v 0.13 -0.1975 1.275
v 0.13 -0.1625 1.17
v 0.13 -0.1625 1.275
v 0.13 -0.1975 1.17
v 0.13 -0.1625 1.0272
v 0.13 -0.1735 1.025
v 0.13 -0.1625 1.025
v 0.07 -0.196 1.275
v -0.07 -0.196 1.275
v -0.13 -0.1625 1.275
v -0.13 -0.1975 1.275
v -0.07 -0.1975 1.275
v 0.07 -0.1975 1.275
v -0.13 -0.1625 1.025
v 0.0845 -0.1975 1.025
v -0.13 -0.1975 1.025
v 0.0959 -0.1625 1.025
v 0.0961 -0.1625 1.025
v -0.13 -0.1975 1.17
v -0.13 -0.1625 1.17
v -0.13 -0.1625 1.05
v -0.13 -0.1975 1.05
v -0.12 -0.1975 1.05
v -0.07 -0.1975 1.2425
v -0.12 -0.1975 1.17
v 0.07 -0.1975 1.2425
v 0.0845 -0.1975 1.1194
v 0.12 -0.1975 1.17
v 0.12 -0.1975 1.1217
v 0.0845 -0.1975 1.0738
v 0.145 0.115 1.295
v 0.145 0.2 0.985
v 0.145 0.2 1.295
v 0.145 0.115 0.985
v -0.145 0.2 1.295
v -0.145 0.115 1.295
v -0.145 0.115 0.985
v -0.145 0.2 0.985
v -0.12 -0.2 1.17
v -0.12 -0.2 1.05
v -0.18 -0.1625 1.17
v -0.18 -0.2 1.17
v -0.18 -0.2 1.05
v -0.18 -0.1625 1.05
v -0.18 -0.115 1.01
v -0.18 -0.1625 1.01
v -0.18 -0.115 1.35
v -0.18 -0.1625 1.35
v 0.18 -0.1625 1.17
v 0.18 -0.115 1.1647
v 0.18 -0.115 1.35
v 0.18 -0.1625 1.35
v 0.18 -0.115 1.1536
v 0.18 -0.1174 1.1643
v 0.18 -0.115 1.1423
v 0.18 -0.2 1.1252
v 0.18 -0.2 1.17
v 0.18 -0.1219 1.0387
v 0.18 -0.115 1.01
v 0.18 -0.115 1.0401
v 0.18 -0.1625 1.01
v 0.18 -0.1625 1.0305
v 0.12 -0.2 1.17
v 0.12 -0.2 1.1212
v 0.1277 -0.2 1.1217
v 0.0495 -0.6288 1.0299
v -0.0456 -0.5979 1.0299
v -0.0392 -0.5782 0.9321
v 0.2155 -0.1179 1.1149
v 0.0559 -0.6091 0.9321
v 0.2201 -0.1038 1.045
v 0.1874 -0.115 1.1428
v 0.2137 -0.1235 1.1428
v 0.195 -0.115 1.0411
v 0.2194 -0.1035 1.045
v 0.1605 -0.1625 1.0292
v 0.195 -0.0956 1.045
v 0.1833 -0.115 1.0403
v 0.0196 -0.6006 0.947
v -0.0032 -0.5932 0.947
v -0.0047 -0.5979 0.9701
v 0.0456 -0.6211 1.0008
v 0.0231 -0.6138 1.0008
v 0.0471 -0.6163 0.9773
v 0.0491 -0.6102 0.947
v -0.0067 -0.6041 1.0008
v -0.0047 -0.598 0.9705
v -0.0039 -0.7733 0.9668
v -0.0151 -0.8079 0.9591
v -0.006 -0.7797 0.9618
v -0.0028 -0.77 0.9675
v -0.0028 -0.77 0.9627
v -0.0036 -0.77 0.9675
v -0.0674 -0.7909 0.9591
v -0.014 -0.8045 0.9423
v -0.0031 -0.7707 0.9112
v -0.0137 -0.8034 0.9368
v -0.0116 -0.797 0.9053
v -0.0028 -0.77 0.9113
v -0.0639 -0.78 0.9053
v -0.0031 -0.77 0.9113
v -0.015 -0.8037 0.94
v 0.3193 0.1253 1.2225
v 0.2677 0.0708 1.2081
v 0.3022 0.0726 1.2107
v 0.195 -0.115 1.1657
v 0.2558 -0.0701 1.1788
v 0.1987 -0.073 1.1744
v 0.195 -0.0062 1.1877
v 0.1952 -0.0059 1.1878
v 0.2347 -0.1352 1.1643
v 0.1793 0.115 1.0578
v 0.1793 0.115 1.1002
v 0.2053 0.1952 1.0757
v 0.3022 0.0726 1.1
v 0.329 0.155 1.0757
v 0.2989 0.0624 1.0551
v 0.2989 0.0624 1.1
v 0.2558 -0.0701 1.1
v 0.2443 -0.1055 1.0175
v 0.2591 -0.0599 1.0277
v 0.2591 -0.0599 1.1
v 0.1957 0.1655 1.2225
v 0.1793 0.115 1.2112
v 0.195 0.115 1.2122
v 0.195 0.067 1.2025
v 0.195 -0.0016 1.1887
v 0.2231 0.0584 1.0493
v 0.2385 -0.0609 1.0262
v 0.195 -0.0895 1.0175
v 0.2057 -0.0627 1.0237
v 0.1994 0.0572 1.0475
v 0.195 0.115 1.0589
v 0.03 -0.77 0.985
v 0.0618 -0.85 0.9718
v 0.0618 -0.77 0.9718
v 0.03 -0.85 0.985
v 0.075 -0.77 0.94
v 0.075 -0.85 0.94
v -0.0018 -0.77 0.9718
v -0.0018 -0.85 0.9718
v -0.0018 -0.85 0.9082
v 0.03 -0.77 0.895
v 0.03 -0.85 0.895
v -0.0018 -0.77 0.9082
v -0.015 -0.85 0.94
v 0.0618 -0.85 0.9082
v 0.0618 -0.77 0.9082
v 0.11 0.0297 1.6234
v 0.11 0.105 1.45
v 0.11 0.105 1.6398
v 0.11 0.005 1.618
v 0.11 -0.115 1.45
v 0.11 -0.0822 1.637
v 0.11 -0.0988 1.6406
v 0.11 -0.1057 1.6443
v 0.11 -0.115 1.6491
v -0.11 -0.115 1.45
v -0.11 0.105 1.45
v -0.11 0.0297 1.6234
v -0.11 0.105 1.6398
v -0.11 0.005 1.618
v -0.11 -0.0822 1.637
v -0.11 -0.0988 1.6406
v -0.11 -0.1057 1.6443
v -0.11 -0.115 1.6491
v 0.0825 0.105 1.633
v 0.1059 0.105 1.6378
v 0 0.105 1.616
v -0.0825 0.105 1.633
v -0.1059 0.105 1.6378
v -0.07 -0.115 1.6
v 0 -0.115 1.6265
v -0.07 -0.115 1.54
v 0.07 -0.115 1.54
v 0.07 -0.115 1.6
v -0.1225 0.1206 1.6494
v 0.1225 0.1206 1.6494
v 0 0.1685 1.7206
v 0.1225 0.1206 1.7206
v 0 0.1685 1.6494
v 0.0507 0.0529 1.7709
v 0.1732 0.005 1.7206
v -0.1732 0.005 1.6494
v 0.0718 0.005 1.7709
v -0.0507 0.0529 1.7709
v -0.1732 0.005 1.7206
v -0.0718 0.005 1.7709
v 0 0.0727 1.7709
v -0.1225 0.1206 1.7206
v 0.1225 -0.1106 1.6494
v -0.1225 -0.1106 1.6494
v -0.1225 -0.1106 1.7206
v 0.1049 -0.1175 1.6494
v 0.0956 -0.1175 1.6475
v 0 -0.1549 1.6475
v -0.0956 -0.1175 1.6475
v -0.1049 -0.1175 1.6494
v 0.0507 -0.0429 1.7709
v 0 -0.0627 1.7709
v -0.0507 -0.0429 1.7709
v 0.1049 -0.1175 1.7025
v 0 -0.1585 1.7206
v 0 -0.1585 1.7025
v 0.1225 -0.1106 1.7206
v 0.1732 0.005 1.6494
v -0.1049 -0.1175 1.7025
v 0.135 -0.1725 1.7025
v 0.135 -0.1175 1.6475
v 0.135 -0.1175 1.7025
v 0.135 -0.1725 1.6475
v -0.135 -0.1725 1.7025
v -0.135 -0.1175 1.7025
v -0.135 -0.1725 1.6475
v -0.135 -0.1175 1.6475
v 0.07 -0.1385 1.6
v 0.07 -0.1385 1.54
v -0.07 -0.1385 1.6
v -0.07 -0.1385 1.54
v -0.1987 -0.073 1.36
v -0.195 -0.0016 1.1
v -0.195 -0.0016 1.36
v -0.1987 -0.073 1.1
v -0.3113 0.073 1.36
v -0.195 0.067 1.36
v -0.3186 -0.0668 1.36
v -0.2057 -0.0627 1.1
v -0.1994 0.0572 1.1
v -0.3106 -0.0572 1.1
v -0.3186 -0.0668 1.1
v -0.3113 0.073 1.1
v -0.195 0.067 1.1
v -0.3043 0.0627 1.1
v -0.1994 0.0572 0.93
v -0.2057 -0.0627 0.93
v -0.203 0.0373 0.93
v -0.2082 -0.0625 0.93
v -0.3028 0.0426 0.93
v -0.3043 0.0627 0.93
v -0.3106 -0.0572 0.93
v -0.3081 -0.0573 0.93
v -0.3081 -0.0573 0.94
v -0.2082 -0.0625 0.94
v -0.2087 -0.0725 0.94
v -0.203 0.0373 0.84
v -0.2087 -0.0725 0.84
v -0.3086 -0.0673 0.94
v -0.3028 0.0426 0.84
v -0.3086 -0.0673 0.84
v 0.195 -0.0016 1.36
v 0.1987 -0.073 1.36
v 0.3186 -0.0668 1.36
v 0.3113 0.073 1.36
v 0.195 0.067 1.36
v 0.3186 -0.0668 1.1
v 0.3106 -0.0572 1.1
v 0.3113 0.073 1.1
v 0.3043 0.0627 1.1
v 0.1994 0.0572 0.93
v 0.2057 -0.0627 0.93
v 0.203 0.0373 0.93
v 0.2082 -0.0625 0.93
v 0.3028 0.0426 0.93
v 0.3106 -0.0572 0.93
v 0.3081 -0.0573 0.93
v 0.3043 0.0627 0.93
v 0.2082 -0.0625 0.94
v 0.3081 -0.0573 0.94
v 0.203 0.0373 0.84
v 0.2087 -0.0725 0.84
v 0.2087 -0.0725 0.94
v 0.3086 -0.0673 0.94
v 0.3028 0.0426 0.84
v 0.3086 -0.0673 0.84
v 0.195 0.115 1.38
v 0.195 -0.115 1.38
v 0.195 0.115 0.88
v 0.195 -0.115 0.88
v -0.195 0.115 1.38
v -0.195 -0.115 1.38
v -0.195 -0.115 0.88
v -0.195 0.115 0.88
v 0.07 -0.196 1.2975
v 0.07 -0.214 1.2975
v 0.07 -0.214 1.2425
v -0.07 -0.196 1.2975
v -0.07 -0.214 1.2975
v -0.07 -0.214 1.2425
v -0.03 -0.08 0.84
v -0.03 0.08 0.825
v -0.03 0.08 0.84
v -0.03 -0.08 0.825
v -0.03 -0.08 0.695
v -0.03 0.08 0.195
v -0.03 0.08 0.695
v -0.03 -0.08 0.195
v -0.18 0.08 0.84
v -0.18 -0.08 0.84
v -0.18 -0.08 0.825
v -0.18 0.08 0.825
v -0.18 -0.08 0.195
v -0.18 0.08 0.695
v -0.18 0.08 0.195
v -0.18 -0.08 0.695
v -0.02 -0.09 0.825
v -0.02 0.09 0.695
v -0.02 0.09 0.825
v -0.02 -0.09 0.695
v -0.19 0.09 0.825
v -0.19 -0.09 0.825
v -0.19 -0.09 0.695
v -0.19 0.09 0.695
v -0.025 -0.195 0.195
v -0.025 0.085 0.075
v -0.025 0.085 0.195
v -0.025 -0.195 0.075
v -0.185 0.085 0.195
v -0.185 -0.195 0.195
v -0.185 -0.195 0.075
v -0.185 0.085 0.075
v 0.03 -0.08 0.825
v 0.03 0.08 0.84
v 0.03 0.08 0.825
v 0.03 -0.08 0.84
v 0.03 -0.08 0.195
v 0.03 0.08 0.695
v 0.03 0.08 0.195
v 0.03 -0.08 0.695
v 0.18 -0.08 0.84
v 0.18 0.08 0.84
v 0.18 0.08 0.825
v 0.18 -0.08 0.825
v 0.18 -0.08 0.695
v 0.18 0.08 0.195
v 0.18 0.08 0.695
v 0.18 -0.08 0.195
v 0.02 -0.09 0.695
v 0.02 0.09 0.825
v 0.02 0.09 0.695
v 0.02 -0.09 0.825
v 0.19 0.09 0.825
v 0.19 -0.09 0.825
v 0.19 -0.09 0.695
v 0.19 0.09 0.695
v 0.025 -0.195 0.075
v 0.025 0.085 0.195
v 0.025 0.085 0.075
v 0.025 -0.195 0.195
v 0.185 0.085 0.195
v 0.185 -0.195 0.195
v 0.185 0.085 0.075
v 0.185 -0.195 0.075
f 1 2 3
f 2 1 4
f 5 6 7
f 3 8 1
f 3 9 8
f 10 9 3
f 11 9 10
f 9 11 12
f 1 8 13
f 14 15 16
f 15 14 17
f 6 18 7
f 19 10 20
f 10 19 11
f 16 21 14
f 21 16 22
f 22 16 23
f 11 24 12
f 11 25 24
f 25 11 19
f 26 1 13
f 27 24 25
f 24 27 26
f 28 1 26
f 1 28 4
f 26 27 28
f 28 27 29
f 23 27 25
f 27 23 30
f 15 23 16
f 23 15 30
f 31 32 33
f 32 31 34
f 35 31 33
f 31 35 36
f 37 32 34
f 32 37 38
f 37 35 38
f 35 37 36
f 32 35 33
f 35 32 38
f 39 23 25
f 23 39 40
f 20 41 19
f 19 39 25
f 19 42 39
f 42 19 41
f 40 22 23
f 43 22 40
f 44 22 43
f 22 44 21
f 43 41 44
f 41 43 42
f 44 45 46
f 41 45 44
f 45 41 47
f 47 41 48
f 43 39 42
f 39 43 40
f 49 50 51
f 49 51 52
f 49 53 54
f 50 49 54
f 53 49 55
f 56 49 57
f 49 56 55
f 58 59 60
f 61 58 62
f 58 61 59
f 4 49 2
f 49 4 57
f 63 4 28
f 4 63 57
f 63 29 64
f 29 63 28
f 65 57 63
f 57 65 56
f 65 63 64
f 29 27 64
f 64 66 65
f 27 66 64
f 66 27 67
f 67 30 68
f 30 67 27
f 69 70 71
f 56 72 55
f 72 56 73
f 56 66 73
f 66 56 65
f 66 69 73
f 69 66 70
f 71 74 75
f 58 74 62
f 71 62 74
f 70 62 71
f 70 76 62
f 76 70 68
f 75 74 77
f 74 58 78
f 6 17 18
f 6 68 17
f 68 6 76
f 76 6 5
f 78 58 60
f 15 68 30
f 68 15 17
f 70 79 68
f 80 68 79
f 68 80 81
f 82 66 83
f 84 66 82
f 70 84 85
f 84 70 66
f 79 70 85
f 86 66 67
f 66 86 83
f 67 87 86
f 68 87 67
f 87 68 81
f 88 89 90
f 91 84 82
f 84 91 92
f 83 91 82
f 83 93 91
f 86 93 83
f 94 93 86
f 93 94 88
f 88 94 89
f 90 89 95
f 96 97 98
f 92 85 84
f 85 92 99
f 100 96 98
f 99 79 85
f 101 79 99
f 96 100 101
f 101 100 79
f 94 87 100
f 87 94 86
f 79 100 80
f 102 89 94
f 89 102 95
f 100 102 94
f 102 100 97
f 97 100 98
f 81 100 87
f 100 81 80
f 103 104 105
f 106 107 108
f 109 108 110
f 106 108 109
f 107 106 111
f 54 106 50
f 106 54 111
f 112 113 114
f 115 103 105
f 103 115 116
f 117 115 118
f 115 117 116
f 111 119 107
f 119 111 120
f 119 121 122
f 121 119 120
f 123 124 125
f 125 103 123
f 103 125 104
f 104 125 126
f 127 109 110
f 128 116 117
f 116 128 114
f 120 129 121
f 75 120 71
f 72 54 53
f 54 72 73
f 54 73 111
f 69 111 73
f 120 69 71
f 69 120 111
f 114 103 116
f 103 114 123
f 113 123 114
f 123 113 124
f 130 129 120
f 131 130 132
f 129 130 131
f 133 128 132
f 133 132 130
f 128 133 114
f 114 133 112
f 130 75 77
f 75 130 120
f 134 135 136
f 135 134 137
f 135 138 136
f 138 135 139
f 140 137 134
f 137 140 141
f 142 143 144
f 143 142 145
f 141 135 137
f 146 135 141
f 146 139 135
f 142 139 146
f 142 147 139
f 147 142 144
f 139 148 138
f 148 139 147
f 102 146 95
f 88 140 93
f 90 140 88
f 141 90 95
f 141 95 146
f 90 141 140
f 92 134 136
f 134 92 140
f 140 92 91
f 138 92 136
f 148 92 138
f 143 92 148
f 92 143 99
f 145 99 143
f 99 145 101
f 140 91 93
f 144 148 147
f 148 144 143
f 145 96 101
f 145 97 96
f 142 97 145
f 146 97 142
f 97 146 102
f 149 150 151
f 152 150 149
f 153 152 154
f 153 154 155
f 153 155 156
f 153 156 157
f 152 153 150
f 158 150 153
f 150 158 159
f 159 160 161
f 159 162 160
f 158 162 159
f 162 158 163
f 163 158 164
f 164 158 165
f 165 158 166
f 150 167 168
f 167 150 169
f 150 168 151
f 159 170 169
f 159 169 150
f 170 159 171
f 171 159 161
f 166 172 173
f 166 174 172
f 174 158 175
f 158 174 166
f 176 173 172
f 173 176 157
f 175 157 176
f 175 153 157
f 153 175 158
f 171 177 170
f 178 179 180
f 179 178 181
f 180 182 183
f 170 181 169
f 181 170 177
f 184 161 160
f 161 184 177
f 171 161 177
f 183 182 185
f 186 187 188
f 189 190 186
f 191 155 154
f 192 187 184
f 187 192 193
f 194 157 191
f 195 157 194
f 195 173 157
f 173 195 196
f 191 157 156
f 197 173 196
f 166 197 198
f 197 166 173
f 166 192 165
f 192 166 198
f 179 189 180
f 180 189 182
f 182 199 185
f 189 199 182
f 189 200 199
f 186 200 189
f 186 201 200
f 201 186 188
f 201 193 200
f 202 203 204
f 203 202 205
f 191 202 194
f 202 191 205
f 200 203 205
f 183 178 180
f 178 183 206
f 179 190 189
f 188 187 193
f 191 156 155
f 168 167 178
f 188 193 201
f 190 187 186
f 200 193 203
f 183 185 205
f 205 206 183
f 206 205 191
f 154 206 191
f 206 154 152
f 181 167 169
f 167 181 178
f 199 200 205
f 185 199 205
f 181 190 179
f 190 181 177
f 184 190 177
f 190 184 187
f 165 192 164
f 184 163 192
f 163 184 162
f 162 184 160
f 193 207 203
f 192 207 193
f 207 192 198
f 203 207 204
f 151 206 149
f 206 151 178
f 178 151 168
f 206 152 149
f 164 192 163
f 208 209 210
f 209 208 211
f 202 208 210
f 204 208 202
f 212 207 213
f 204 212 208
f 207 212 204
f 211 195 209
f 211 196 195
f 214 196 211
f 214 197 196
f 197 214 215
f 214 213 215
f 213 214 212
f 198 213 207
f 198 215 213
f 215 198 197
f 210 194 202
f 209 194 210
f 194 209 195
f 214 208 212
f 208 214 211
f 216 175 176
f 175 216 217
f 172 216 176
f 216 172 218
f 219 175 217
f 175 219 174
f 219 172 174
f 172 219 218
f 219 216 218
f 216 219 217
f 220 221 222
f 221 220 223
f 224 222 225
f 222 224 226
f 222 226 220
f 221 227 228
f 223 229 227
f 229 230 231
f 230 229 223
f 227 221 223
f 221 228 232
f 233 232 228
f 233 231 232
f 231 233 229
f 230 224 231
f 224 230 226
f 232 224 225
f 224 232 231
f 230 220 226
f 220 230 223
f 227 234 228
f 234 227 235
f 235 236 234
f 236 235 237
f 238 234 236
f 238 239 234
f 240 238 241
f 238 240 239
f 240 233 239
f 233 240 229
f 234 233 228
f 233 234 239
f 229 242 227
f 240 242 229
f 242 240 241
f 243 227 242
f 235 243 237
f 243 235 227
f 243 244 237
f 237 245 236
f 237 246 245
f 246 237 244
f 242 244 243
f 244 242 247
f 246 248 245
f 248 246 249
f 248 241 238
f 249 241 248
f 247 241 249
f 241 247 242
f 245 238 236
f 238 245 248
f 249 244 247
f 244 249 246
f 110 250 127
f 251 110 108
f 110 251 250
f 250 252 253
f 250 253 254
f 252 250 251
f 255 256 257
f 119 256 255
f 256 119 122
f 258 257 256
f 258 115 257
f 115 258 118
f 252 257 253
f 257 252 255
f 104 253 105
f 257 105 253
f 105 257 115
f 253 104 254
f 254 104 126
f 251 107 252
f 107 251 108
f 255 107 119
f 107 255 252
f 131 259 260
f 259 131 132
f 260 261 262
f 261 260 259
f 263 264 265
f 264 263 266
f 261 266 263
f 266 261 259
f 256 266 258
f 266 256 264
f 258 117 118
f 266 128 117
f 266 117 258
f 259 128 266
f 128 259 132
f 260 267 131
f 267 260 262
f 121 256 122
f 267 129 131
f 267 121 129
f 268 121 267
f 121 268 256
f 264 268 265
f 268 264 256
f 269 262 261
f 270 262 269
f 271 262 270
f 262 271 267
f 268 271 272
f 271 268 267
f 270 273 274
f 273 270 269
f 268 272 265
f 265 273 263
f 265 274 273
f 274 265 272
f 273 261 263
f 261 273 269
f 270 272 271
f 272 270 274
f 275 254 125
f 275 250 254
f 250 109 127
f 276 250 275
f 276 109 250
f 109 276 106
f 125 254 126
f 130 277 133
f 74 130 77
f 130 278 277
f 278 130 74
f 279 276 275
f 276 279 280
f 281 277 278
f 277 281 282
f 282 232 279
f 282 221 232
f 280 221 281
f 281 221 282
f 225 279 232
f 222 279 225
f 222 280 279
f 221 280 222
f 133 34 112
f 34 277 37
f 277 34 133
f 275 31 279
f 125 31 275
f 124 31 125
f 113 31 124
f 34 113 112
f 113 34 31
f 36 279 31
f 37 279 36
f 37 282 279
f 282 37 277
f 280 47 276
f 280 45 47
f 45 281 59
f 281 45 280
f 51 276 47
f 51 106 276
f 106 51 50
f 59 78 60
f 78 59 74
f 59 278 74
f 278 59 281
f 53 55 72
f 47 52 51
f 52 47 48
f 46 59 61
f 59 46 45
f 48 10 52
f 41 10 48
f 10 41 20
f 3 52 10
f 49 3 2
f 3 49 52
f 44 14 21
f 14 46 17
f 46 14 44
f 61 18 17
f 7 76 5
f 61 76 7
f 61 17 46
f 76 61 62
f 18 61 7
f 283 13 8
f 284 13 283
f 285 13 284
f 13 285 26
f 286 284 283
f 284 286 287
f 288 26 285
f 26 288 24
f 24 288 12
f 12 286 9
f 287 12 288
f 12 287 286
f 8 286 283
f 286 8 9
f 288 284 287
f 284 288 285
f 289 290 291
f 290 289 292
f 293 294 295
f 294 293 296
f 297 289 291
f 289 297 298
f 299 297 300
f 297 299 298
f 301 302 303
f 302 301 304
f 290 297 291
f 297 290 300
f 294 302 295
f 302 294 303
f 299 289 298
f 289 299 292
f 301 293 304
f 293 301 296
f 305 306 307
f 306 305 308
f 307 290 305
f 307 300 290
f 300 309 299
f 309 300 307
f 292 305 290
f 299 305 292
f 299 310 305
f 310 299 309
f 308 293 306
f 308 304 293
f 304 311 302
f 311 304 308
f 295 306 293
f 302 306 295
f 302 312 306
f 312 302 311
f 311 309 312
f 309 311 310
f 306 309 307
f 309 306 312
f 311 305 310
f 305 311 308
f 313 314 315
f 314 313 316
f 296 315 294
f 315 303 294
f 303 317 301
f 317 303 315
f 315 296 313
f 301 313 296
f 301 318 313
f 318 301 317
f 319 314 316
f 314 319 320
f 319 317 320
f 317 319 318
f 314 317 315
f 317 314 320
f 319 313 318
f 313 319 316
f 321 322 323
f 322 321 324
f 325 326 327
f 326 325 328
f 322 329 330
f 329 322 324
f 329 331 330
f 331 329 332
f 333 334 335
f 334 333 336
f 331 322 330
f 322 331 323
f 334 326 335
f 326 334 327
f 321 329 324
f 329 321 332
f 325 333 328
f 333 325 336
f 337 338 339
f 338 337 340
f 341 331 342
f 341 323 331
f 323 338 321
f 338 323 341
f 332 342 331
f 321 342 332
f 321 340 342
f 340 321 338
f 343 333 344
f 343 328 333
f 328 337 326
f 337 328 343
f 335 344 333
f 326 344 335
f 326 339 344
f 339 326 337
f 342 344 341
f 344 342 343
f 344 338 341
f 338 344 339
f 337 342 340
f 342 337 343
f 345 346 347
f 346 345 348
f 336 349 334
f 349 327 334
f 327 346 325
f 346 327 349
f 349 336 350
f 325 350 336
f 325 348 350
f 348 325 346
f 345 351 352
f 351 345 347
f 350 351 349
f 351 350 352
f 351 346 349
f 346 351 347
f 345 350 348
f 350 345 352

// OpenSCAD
// ============================================================================
// next_ra_soldier.scad - NextRA low-poly rigid soldier
//
// ScadRig contract:
//   * 1 unit = 1 metre, Z-up, root origin on the ground between the boots.
//   * Character faces -Y (engine +Z). Bound height is 1.78 m.
//   * Pure magenta ROLECOLOR is the runtime faction-tint placeholder.
//   * loadout 0 = rifleman, loadout 1 = rocketeer. The standalone rig uses 0.
//
// Scene usage:
//   use <characters/next_ra_soldier.scad>
//   Define the palette variables below in the caller, then call bone_root(0/1).
// ============================================================================

$fn = 8;

ROLECOLOR  = [1.00, 0.00, 1.00];
ROLEACCENT = [0.88, 0.68, 0.16];
UNIFORM    = [0.20, 0.23, 0.22];
VEST       = [0.12, 0.14, 0.14];
METAL      = [0.18, 0.19, 0.20];
METALL     = [0.48, 0.51, 0.52];
SKIN       = [0.72, 0.52, 0.38];
BOOT       = [0.08, 0.075, 0.07];

module part_leg()
{
    color(UNIFORM) translate([0, 0, -0.33]) cube([0.15, 0.16, 0.66], center = true);
    color(VEST) translate([0, 0, -0.08]) cube([0.17, 0.18, 0.13], center = true);
    color(BOOT) translate([0, -0.055, -0.705]) cube([0.16, 0.28, 0.12], center = true);
    color(ROLECOLOR) translate([0, -0.13, -0.69]) cube([0.10, 0.035, 0.06], center = true);
}

module part_arm()
{
    color(ROLECOLOR) translate([0, 0, -0.13]) cube([0.12, 0.14, 0.26], center = true);
    color(UNIFORM) translate([0, 0, -0.34]) cube([0.105, 0.12, 0.18], center = true);
    color(SKIN) translate([0, -0.015, -0.47]) cube([0.10, 0.11, 0.10], center = true);
}

module part_rifle()
{
    color(METAL) translate([0.12, -0.25, 0.18]) rotate([12, 0, -18]) cube([0.10, 0.76, 0.10], center = true);
    color(METALL) translate([0.03, -0.58, 0.10]) rotate([12, 0, -18]) cube([0.055, 0.46, 0.055], center = true);
    color(BOOT) translate([0.22, 0.03, 0.24]) rotate([12, 0, -18]) cube([0.13, 0.28, 0.15], center = true);
    color(ROLEACCENT) translate([0.03, -0.81, 0.06]) rotate([90, 0, 0]) cylinder(h = 0.08, r = 0.045, center = true);
}

module part_rocket_launcher()
{
    color(METAL) translate([0.20, -0.20, 0.46]) rotate([90, 0, 0]) cylinder(h = 1.00, r = 0.105, center = true);
    color(METALL) translate([0.20, 0.25, 0.46]) rotate([90, 0, 0]) cylinder(h = 0.10, r1 = 0.17, r2 = 0.105, center = true);
    color(ROLEACCENT) translate([0.20, -0.68, 0.46]) rotate([90, 0, 0]) cylinder(h = 0.08, r = 0.13, center = true);
    color(BOOT) translate([0.20, -0.16, 0.25]) cube([0.07, 0.26, 0.30], center = true);
    color(ROLECOLOR)
    {
        translate([-0.16, 0.13, 0.17]) cube([0.14, 0.19, 0.38], center = true);
        translate([ 0.16, 0.13, 0.17]) cube([0.14, 0.19, 0.38], center = true);
    }
}

module bone_head()
{
    color(SKIN) translate([0, -0.005, 0.13]) cube([0.22, 0.22, 0.24], center = true);
    color(ROLECOLOR) translate([0, 0.005, 0.245]) scale([1.25, 1.18, 0.62]) sphere(r = 0.15);
    color(VEST) translate([0, -0.145, 0.235]) cube([0.27, 0.055, 0.055], center = true);
    color(METAL) translate([0, -0.126, 0.13]) cube([0.14, 0.025, 0.06], center = true);
}

module bone_arm_l() { part_arm(); }
module bone_arm_r() { mirror([1, 0, 0]) part_arm(); }
module bone_leg_l() { part_leg(); }
module bone_leg_r() { mirror([1, 0, 0]) part_leg(); }

module bone_torso(loadout = 0)
{
    color(UNIFORM) translate([0, 0, 0.25]) cube([0.39, 0.23, 0.50], center = true);
    color(ROLECOLOR) translate([0, -0.135, 0.30]) cube([0.36, 0.055, 0.34], center = true);
    color(VEST)
    {
        translate([0, -0.175, 0.27]) cube([0.26, 0.045, 0.25], center = true);
        translate([0, 0.155, 0.26]) cube([0.29, 0.09, 0.31], center = true);
        translate([-0.15, -0.175, 0.23]) cube([0.06, 0.05, 0.12], center = true);
        translate([ 0.15, -0.175, 0.23]) cube([0.06, 0.05, 0.12], center = true);
    }
    color(ROLEACCENT) translate([0, -0.205, 0.39]) cube([0.14, 0.018, 0.055], center = true);

    if (loadout == 0) part_rifle();
    else part_rocket_launcher();

    translate([0, 0, 0.56]) bone_head();
    translate([-0.255, 0, 0.48]) rotate([0, 0, -3]) bone_arm_l();
    translate([ 0.255, 0, 0.48]) rotate([0, 0,  3]) bone_arm_r();
}

module bone_root(loadout = 0)
{
    translate([0, 0, 0.88]) bone_torso(loadout);
    translate([-0.105, 0, 0.84]) bone_leg_l();
    translate([ 0.105, 0, 0.84]) bone_leg_r();
}

bone_root(0);

anim_idle = [
    ["bone_torso", "rot", [for (t = [0 : 0.25 : 2]) [t, [1.5 * sin(180 * t), 0, 0]]]],
    ["bone_head", "rot", [[0, [0, 0, -3]], [1, [0, 0, 3]], [2, [0, 0, -3]]]],
];

anim_walk = [
    ["bone_leg_l", "rot", [[0, [ 32, 0, 0]], [0.4, [-32, 0, 0]], [0.8, [ 32, 0, 0]]]],
    ["bone_leg_r", "rot", [[0, [-32, 0, 0]], [0.4, [ 32, 0, 0]], [0.8, [-32, 0, 0]]]],
    ["bone_arm_l", "rot", [[0, [-20, 0, 0]], [0.4, [ 20, 0, 0]], [0.8, [-20, 0, 0]]]],
    ["bone_arm_r", "rot", [[0, [ 20, 0, 0]], [0.4, [-20, 0, 0]], [0.8, [ 20, 0, 0]]]],
    ["bone_root", "pos", [[0, [0, 0, 0]], [0.2, [0, 0, 0.035]], [0.4, [0, 0, 0]],
                            [0.6, [0, 0, 0.035]], [0.8, [0, 0, 0]]]],
];

anim_fire = [
    ["loop", false],
    ["bone_torso", "rot", [[0, [2, 0, 0]], [0.08, [-4, 0, 0]], [0.22, [2, 0, 0]]]],
    ["bone_arm_l", "rot", [[0, [-52, 0, -12]], [0.22, [-52, 0, -12]]]],
    ["bone_arm_r", "rot", [[0, [-58, 0, 10]], [0.22, [-58, 0, 10]]]],
];
